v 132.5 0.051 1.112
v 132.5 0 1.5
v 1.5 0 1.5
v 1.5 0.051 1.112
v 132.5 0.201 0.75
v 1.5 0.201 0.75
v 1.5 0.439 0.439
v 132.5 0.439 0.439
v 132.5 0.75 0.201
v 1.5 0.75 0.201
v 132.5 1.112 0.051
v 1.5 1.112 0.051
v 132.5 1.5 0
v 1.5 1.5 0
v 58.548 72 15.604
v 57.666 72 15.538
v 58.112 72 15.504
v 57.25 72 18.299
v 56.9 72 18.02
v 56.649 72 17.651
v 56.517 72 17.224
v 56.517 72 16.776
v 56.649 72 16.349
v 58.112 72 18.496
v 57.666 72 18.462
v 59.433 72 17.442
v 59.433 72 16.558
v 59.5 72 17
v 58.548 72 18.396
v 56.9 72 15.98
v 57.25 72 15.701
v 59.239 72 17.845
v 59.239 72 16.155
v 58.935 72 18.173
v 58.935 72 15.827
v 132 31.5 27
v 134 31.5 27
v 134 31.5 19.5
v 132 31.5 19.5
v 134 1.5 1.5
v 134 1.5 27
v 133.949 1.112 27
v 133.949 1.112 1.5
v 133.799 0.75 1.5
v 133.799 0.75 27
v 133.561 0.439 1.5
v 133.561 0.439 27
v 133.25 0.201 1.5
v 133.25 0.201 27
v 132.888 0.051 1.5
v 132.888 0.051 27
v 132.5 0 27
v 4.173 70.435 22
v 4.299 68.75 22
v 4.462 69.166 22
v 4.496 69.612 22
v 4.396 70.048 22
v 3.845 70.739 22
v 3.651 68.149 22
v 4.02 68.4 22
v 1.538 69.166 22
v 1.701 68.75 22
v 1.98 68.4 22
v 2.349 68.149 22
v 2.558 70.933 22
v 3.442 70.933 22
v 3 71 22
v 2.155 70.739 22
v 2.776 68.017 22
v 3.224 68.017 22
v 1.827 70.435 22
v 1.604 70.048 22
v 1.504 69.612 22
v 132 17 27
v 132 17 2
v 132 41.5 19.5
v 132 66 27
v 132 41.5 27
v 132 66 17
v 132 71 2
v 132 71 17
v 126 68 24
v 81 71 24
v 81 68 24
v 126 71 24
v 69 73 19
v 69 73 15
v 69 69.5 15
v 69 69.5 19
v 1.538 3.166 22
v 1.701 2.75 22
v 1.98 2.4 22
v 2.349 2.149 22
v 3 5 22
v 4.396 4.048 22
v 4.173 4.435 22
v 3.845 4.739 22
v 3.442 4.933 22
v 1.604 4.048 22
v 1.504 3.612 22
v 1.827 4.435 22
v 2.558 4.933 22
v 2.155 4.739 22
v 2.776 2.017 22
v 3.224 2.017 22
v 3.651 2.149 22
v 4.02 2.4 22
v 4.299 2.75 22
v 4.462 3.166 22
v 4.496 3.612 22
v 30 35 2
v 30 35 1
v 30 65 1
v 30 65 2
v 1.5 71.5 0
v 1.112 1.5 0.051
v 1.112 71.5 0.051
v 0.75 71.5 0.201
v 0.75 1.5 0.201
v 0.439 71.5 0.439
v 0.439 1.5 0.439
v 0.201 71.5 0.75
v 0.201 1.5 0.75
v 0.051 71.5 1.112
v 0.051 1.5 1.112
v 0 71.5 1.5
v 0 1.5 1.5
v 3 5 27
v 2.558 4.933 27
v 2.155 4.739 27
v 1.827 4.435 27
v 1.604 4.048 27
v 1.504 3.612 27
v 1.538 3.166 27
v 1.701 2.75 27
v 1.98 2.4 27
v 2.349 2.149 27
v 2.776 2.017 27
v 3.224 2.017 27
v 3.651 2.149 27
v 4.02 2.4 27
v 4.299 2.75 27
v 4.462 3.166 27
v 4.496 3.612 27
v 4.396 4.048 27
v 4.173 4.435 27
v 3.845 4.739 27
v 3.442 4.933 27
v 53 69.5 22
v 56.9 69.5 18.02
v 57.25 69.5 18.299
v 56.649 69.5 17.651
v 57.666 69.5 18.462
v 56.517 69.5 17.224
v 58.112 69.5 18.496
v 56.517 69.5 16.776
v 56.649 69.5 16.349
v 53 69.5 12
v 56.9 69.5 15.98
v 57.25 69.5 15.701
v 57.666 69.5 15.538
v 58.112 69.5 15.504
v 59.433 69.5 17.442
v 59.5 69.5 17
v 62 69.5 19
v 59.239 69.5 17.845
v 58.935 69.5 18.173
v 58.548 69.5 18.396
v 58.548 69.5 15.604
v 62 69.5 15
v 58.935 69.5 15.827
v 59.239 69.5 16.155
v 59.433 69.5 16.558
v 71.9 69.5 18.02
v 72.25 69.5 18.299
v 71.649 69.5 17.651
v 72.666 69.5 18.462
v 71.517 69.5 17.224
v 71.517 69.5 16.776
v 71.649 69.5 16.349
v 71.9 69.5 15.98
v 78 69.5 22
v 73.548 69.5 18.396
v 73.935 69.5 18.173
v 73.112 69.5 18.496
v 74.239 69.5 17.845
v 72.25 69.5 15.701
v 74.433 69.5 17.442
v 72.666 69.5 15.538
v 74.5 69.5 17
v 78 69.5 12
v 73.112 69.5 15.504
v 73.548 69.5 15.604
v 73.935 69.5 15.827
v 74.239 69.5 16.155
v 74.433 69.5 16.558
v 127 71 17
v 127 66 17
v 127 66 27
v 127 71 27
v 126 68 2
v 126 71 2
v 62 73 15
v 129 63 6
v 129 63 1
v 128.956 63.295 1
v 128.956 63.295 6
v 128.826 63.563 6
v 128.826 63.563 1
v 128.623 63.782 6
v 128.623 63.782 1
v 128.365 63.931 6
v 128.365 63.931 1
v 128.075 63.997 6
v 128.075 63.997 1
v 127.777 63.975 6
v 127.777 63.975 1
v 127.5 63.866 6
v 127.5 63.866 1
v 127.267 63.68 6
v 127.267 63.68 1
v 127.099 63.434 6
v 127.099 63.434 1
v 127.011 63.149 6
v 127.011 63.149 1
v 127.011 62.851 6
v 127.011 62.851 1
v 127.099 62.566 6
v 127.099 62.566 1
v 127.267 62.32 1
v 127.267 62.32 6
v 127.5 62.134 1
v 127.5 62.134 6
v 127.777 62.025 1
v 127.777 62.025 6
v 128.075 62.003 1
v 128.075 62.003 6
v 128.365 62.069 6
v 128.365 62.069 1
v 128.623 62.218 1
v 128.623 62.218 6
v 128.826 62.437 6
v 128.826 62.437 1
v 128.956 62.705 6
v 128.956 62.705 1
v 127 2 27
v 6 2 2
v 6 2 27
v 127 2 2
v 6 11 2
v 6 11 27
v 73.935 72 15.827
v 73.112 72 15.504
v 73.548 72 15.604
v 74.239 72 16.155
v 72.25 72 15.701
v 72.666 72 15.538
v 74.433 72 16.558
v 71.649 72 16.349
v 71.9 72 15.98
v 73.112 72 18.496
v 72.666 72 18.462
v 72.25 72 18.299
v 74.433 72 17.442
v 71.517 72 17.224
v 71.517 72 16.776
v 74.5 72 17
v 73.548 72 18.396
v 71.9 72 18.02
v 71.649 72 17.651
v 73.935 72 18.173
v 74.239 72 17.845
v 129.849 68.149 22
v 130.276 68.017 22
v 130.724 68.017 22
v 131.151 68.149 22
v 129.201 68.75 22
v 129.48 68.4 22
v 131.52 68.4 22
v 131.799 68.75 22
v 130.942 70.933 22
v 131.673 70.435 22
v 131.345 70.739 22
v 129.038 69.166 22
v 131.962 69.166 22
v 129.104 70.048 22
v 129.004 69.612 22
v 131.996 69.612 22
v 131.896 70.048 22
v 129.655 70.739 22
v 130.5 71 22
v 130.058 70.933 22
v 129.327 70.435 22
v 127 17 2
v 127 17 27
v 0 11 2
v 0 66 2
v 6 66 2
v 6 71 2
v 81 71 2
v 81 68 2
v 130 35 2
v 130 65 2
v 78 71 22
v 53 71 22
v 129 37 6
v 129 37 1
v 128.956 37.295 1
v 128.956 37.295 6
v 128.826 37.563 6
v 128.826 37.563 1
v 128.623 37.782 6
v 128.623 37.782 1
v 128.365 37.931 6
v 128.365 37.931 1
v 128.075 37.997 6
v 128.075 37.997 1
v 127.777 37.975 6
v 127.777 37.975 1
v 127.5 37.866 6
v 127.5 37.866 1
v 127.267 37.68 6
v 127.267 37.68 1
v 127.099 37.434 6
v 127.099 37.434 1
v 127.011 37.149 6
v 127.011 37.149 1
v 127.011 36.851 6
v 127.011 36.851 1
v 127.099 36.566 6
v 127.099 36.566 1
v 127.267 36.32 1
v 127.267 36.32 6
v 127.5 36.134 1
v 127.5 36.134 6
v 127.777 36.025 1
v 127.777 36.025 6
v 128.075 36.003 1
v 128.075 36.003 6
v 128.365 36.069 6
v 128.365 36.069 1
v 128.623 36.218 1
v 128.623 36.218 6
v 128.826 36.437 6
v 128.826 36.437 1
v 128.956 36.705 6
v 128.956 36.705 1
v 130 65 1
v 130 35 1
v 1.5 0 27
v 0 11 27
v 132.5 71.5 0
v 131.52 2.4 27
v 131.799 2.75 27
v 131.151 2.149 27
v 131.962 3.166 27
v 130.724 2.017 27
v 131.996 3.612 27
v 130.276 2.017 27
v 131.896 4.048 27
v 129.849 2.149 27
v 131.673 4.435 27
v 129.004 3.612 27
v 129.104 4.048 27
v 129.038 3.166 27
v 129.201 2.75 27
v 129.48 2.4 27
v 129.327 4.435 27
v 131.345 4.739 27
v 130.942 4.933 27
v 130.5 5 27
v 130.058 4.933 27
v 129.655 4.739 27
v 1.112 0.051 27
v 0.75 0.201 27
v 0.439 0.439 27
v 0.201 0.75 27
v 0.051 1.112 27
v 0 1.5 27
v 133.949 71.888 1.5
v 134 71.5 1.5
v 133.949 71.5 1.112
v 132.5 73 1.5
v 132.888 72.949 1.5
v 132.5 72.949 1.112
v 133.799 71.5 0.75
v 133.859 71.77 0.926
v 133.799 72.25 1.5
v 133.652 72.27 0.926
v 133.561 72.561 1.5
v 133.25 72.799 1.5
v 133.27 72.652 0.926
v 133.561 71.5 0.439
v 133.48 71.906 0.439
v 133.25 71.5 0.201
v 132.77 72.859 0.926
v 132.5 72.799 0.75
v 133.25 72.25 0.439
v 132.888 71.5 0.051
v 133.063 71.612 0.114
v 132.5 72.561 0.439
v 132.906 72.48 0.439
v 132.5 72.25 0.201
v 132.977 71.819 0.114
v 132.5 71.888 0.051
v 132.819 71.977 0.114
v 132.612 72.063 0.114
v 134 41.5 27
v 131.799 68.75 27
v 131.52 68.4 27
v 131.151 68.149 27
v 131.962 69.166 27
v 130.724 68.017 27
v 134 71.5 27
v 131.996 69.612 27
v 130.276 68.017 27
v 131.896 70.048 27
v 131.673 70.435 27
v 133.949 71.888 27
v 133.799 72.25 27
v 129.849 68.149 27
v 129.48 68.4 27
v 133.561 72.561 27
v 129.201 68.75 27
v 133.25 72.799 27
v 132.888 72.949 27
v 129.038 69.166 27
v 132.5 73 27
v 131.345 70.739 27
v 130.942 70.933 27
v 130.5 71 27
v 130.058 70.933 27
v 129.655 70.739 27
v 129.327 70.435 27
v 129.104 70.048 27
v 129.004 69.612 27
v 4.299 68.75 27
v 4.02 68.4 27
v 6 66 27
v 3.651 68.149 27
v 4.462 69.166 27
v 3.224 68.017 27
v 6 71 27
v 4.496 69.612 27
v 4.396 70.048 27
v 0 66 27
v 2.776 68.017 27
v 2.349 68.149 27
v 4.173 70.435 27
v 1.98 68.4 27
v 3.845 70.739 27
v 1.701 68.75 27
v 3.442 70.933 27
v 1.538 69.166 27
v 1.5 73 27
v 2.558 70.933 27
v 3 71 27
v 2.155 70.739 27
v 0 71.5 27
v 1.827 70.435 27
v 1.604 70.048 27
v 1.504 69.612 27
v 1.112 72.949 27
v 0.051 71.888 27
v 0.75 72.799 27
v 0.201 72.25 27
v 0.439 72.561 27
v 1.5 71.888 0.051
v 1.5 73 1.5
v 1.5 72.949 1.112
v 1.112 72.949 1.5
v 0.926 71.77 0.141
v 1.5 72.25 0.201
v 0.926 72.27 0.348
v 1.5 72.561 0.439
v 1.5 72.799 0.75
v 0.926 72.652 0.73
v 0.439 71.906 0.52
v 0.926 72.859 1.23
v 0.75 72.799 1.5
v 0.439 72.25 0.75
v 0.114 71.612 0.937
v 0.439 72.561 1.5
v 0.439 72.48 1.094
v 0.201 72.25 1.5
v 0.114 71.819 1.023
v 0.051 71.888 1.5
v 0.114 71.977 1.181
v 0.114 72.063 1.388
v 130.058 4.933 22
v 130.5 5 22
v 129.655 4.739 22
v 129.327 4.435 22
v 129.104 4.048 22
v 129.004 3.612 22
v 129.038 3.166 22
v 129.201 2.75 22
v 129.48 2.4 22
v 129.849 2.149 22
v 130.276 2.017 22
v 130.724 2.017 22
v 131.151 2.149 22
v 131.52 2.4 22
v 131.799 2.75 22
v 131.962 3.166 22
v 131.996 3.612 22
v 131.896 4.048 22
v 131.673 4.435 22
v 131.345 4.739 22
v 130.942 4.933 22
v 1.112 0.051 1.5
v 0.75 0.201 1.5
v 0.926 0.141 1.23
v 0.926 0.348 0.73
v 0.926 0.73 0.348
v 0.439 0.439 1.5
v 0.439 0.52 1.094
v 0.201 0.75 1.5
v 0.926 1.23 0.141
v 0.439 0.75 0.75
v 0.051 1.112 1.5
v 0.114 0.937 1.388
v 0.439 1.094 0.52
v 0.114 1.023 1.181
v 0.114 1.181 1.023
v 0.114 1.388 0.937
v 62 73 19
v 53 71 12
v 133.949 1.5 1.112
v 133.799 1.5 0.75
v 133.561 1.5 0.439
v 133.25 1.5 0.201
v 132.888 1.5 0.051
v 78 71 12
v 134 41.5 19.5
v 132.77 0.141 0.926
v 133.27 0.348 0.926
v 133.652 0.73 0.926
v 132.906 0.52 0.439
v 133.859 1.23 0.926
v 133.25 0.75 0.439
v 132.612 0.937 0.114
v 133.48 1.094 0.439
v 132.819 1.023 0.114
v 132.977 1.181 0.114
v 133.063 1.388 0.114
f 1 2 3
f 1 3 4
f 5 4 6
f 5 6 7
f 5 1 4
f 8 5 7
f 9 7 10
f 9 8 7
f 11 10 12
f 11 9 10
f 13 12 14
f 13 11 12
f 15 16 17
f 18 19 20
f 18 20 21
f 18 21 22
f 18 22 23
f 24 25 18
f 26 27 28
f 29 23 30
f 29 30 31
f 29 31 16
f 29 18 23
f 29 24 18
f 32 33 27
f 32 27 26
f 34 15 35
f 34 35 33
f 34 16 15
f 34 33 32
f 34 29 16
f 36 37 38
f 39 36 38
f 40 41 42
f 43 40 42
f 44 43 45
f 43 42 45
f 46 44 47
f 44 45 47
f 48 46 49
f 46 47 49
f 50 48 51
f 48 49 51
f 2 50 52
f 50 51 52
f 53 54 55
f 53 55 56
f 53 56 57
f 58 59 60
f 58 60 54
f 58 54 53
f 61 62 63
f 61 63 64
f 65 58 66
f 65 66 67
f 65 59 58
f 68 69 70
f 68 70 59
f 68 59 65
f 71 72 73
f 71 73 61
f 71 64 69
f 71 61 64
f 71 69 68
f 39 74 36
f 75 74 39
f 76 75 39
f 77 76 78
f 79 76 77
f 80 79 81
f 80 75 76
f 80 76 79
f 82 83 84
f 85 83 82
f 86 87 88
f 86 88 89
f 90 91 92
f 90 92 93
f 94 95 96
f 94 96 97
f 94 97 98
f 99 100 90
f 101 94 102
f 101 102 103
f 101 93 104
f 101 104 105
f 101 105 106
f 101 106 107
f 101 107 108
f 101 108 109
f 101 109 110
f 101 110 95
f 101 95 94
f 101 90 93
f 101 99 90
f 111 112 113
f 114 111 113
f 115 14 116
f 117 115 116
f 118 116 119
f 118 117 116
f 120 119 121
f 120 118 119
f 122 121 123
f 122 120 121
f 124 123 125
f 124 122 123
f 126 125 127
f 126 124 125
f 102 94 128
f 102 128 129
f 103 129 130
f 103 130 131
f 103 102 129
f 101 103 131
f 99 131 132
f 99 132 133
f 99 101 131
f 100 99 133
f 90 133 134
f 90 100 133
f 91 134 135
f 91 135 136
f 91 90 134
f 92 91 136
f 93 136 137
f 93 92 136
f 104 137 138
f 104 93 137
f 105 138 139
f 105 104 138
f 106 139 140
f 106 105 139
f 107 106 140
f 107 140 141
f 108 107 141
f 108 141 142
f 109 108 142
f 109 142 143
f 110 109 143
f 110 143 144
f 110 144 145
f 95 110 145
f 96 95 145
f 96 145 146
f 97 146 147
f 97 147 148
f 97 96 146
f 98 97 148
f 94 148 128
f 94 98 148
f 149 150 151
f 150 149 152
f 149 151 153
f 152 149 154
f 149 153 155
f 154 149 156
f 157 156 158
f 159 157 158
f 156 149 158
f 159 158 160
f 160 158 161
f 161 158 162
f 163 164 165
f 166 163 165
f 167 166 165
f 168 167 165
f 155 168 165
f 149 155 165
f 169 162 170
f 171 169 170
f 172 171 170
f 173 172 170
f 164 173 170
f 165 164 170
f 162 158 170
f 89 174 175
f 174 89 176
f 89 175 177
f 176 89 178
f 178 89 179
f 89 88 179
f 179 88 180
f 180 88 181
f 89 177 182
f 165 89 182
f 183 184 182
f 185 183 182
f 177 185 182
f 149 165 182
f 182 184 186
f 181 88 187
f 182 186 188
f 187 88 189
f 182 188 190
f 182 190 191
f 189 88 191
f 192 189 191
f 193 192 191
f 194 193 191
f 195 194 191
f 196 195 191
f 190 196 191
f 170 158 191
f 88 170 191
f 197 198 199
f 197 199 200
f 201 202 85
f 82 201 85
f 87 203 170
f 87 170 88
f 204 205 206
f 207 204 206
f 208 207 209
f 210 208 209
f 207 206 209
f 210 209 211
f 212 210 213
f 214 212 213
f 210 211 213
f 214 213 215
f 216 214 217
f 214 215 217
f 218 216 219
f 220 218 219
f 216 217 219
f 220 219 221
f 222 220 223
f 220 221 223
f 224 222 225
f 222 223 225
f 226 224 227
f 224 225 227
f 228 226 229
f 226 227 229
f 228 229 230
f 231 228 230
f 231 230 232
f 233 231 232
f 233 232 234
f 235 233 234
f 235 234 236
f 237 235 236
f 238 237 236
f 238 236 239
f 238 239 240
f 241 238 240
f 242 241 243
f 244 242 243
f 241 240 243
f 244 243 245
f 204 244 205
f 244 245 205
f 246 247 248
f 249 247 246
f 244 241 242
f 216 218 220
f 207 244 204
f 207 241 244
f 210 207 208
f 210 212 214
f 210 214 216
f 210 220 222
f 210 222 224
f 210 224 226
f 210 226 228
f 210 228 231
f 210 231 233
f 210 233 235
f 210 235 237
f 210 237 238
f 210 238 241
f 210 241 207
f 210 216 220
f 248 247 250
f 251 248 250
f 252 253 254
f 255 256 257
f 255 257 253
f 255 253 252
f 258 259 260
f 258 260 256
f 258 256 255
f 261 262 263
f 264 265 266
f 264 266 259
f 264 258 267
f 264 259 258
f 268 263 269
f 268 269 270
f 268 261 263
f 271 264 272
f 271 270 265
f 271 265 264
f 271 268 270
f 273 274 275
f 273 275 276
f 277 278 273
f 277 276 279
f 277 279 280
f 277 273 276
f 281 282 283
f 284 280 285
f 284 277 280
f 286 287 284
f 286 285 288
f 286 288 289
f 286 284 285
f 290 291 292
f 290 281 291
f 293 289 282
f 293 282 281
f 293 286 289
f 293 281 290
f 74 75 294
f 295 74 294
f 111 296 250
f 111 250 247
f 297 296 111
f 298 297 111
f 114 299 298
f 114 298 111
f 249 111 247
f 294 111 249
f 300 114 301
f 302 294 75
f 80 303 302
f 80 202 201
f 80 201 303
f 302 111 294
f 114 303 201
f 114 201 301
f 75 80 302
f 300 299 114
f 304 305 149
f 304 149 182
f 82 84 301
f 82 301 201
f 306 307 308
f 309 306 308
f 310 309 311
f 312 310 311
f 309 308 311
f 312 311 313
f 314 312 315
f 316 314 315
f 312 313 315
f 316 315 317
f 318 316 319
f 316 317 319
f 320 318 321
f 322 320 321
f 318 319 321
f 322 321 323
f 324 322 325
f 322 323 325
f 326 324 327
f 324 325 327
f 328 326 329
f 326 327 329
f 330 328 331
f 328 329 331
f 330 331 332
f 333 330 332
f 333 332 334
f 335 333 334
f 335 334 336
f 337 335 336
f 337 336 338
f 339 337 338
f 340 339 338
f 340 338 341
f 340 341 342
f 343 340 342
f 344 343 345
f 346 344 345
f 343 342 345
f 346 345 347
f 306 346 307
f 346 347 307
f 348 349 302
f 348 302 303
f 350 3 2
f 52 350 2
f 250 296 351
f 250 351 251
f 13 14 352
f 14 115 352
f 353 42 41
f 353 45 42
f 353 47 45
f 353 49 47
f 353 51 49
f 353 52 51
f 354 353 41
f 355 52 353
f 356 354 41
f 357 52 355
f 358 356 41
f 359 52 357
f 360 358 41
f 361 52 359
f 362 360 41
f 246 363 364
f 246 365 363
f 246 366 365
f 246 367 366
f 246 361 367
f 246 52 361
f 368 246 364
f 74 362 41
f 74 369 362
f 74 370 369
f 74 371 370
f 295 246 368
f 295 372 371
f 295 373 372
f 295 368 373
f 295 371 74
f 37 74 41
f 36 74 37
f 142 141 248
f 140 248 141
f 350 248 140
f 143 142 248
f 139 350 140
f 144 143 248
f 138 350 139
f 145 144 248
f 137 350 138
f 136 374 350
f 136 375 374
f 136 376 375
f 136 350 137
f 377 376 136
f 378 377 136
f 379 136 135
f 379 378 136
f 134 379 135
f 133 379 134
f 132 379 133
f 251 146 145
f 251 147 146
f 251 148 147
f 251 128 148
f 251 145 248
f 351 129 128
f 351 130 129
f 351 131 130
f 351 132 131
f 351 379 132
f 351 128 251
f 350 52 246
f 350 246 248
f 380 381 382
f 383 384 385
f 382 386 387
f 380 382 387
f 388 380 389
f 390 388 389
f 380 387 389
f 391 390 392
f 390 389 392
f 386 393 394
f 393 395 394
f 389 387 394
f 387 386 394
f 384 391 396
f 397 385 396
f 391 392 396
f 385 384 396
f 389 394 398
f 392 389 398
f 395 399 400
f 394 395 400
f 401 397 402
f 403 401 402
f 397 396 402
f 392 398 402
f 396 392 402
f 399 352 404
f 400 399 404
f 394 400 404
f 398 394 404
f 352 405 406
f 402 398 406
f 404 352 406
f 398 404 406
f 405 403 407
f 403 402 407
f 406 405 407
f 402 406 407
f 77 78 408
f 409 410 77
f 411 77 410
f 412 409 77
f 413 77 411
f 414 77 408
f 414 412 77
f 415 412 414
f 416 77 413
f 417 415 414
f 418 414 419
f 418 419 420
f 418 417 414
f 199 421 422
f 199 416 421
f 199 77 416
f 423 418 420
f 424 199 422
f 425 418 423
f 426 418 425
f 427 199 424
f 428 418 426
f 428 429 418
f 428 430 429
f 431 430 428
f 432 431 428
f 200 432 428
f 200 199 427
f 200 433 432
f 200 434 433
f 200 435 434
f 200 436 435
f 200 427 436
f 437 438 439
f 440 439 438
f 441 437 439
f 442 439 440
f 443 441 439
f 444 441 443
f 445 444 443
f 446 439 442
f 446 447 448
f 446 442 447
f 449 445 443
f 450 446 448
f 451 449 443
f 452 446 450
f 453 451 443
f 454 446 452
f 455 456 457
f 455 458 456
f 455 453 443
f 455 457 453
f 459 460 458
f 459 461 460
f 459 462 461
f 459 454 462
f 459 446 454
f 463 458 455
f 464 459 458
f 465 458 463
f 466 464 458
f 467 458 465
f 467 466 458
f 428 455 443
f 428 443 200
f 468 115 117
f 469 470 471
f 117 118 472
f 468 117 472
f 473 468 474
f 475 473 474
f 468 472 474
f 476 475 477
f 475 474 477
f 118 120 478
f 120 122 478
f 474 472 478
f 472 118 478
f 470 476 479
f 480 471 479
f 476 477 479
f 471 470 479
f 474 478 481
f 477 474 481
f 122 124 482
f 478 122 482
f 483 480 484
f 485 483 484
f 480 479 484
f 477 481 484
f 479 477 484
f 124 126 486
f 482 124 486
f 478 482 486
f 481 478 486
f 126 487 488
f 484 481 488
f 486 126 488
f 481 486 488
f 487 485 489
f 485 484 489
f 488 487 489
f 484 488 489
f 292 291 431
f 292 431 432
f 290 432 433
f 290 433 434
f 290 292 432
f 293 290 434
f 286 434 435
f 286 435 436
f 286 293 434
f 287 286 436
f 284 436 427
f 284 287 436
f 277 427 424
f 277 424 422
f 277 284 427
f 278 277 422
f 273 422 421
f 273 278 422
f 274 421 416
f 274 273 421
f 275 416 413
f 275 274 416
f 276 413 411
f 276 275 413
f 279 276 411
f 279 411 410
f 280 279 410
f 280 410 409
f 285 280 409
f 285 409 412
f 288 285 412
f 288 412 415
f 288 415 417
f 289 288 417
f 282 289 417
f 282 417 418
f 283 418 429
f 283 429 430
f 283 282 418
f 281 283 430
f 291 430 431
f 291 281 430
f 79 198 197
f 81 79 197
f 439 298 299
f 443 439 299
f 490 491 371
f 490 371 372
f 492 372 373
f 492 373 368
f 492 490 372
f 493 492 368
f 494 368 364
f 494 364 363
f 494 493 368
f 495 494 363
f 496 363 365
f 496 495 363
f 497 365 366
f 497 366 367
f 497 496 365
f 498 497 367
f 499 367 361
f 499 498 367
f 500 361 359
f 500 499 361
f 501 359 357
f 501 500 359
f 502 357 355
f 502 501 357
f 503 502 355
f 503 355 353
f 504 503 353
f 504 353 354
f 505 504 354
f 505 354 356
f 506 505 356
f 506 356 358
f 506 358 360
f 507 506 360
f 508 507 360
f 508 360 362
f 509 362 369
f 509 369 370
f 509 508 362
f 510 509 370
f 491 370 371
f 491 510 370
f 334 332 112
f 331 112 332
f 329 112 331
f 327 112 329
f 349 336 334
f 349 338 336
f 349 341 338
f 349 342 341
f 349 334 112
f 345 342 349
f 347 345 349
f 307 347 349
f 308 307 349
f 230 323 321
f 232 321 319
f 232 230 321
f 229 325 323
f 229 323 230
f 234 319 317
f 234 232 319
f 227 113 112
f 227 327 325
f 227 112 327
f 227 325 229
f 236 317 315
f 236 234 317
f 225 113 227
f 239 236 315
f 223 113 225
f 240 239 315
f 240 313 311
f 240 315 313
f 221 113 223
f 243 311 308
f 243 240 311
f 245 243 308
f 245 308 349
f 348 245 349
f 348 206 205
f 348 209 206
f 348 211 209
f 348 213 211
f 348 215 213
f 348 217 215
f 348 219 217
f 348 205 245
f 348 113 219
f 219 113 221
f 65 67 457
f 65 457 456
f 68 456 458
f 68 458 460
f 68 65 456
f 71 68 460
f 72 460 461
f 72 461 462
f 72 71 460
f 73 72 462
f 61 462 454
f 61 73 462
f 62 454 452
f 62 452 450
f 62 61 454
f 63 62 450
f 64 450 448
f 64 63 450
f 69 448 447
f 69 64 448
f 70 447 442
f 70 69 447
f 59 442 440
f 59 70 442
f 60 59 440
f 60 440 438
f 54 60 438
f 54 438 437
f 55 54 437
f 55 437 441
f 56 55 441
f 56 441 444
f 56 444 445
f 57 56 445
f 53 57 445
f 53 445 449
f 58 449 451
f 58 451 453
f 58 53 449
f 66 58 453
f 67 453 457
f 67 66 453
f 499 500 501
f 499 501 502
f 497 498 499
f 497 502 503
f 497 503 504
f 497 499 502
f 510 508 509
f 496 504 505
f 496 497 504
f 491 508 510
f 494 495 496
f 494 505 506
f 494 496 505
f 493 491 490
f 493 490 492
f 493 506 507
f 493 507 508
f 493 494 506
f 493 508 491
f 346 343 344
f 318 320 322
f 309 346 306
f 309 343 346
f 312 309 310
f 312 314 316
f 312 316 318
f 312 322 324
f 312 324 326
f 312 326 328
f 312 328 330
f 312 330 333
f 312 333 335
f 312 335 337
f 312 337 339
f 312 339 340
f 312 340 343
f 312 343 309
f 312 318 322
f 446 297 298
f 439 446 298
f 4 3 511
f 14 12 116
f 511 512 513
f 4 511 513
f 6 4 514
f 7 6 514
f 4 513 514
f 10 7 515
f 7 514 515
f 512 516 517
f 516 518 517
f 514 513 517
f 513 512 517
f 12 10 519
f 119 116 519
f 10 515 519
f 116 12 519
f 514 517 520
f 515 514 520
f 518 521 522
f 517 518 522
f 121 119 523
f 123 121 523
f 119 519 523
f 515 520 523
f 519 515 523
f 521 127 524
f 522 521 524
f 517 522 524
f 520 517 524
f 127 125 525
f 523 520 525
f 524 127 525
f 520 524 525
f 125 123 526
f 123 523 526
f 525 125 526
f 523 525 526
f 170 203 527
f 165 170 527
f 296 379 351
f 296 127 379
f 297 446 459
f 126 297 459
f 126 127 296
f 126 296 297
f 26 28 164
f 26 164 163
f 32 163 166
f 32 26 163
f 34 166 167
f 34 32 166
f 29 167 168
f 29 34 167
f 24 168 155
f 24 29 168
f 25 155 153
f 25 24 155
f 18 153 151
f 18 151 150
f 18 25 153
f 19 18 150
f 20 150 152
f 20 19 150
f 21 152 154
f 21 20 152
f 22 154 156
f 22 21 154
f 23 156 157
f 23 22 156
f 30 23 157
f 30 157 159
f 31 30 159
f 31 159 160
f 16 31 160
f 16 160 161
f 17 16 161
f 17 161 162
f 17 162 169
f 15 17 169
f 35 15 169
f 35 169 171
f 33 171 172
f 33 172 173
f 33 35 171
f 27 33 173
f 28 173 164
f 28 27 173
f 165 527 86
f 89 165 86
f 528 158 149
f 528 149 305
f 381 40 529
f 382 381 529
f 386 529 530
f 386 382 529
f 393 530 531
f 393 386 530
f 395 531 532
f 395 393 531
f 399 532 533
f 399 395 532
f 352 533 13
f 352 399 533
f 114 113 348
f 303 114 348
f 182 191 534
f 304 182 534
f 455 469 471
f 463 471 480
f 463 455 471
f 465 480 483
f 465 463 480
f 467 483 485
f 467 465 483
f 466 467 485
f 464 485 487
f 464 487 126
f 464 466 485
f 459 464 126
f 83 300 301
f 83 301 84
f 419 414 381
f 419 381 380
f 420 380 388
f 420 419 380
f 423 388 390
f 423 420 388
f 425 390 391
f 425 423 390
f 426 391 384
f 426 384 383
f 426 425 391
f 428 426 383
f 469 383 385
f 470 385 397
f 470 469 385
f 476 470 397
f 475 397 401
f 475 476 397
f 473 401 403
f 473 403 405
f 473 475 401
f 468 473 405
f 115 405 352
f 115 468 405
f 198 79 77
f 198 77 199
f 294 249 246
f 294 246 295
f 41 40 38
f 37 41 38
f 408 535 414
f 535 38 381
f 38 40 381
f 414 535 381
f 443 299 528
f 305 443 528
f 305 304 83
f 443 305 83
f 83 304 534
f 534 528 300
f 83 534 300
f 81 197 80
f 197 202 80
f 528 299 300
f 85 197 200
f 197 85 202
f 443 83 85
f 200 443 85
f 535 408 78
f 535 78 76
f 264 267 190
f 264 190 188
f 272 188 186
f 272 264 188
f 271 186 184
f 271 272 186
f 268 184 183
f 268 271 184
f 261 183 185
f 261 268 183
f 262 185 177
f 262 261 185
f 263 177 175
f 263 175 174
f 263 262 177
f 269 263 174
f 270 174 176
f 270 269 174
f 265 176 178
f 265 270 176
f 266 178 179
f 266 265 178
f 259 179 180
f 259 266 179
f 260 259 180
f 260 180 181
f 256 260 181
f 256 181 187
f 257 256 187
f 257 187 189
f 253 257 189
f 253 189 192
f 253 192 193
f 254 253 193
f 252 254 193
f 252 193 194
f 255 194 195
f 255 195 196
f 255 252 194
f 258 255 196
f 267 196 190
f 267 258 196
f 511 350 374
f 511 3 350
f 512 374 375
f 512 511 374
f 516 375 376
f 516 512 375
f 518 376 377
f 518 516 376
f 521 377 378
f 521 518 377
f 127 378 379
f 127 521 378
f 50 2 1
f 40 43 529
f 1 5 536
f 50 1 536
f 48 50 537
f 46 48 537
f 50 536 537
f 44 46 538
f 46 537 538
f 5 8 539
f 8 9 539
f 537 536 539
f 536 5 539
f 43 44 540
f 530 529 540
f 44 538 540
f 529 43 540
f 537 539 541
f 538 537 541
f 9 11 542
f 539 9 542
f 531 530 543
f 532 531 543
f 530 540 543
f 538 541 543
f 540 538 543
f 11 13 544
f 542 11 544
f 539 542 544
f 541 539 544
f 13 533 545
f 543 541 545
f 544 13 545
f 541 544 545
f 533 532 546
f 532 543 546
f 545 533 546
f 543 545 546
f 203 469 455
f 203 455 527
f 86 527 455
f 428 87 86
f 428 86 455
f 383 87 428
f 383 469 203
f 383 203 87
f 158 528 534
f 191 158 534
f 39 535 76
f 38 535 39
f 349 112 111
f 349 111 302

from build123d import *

# Parameters (mm, degrees)
BOX_W             = 134
BOX_H             = 73
BOX_DEPTH         = 27
BOX001_W          = 126
BOX001_H          = 69
BOX001_DEPTH      = 25
BOX002_W          = 10
BOX002_H          = 55
BOX002_DEPTH      = 25
BOX003_W          = 100
BOX003_H          = 30
BOX003_DEPTH      = 1
CYLINDER_R        = 1
CYLINDER_DEPTH    = 5
CYLINDER001_R     = 1
CYLINDER001_DEPTH = 5
BOX004_W          = 25
BOX004_H          = 1.5
BOX004_DEPTH      = 10
BOX005_W          = 7
BOX005_H          = 4
BOX005_DEPTH      = 7
CYLINDER002_R     = 1.5
CYLINDER002_DEPTH = 2.5
CYLINDER003_R     = 1.5
CYLINDER003_DEPTH = 2.5
BOX006_W          = 45
BOX006_H          = 22
BOX006_DEPTH      = 3
BOX007_W          = 7.5
BOX007_H          = 10
BOX007_DEPTH      = 2
BOX008_W          = 15
BOX008_H          = 5
BOX008_DEPTH      = 25
BOX009_W          = 5
BOX009_H          = 5
BOX009_DEPTH      = 10
CYLINDER004_R     = 1.5
CYLINDER004_DEPTH = 5
CYLINDER005_R     = 1.5
CYLINDER005_DEPTH = 5
CYLINDER006_R     = 1.5
CYLINDER006_DEPTH = 5
CYLINDER007_R     = 1.5
CYLINDER007_DEPTH = 5
FILLET_R          = 1.5
FILLET001_R       = 1.5
FILLET002_R       = 1.5
FILLET003_R       = 1.5


with BuildPart() as part:
    # Box → Box (join)
    with BuildSketch(Plane.XY):
        with Locations((67, 36.5)):
            Rectangle(BOX_W, BOX_H)
    extrude(amount=BOX_DEPTH)

    # Box001 → Box001 (cut)
    with BuildSketch(Plane(origin=(6, 2, 2), x_dir=(1, 0, 0), z_dir=(0, 0, 1))):
        with Locations((63, 34.5)):
            Rectangle(BOX001_W, BOX001_H)
    extrude(amount=BOX001_DEPTH, mode=Mode.SUBTRACT)

    # Box002 → Box002 (cut)
    with BuildSketch(Plane(origin=(-2, 11, 2), x_dir=(1, 0, 0), z_dir=(0, 0, 1))):
        with Locations((5, 27.5)):
            Rectangle(BOX002_W, BOX002_H)
    extrude(amount=BOX002_DEPTH, mode=Mode.SUBTRACT)

    # Box003 → Box003 (cut)
    with BuildSketch(Plane(origin=(30, 35, 1), x_dir=(1, 0, 0), z_dir=(0, 0, 1))):
        with Locations((50, 15)):
            Rectangle(BOX003_W, BOX003_H)
    extrude(amount=BOX003_DEPTH, mode=Mode.SUBTRACT)

    # Cylinder → Cylinder (join)
    with BuildSketch(Plane(origin=(128, 37, 1), x_dir=(1, 0, 0), z_dir=(0, 0, 1))):
        Circle(CYLINDER_R)
    extrude(amount=CYLINDER_DEPTH)

    # Cylinder001 → Cylinder001 (join)
    with BuildSketch(Plane(origin=(128, 63, 1), x_dir=(1, 0, 0), z_dir=(0, 0, 1))):
        Circle(CYLINDER001_R)
    extrude(amount=CYLINDER001_DEPTH)

    # Box004 → Box004 (join)
    with BuildSketch(Plane(origin=(53, 69.5, 12), x_dir=(1, 0, 0), z_dir=(0, 0, 1))):
        with Locations((12.5, 0.75)):
            Rectangle(BOX004_W, BOX004_H)
    extrude(amount=BOX004_DEPTH)

    # Box005 → Box005 (cut)
    with BuildSketch(Plane(origin=(62, 74.5, 15), x_dir=(1, 0, 0), z_dir=(0, -1, 0))):
        with Locations((3.5, 2)):
            Rectangle(BOX005_W, BOX005_H)
    extrude(amount=BOX005_DEPTH, mode=Mode.SUBTRACT)

    # Cylinder002 → Cylinder002 (cut)
    with BuildSketch(Plane(origin=(58, 72, 17), x_dir=(1, 0, 0), z_dir=(0, -1, 0))):
        Circle(CYLINDER002_R)
    extrude(amount=CYLINDER002_DEPTH, mode=Mode.SUBTRACT)

    # Cylinder003 → Cylinder003 (cut)
    with BuildSketch(Plane(origin=(73, 72, 17), x_dir=(1, 0, 0), z_dir=(0, -1, 0))):
        Circle(CYLINDER003_R)
    extrude(amount=CYLINDER003_DEPTH, mode=Mode.SUBTRACT)

    # Box006 → Box006 (join)
    with BuildSketch(Plane(origin=(81, 71, 2), x_dir=(1, 0, 0), z_dir=(0, -1, 0))):
        with Locations((22.5, 11)):
            Rectangle(BOX006_W, BOX006_H)
    extrude(amount=BOX006_DEPTH)

    # Box007 → Box007 (cut)
    with BuildSketch(Plane(origin=(134, 41.5, 27), x_dir=(0, 0, -1), z_dir=(-1, 0, 0))):
        with Locations((3.75, 5)):
            Rectangle(BOX007_W, BOX007_H)
    extrude(amount=BOX007_DEPTH, mode=Mode.SUBTRACT)

    # Box008 → Box008 (join)
    with BuildSketch(Plane(origin=(132, 2, 2), x_dir=(0, 1, 0), z_dir=(0, 0, 1))):
        with Locations((7.5, 2.5)):
            Rectangle(BOX008_W, BOX008_H)
    extrude(amount=BOX008_DEPTH)

    # Box009 → Box009 (join)
    with BuildSketch(Plane(origin=(132, 66, 17), x_dir=(0, 1, 0), z_dir=(0, 0, 1))):
        with Locations((2.5, 2.5)):
            Rectangle(BOX009_W, BOX009_H)
    extrude(amount=BOX009_DEPTH)

    # Cylinder004 → Cylinder004 (cut)
    with BuildSketch(Plane(origin=(130.5, 69.5, 22), x_dir=(0, 1, 0), z_dir=(0, 0, 1))):
        Circle(CYLINDER004_R)
    extrude(amount=CYLINDER004_DEPTH, mode=Mode.SUBTRACT)

    # Cylinder005 → Cylinder005 (cut)
    with BuildSketch(Plane(origin=(130.5, 3.5, 22), x_dir=(0, 1, 0), z_dir=(0, 0, 1))):
        Circle(CYLINDER005_R)
    extrude(amount=CYLINDER005_DEPTH, mode=Mode.SUBTRACT)

    # Cylinder006 → Cylinder006 (cut)
    with BuildSketch(Plane(origin=(3, 3.5, 22), x_dir=(0, 1, 0), z_dir=(0, 0, 1))):
        Circle(CYLINDER006_R)
    extrude(amount=CYLINDER006_DEPTH, mode=Mode.SUBTRACT)

    # Cylinder007 → Cylinder007 (cut)
    with BuildSketch(Plane(origin=(3, 69.5, 22), x_dir=(0, 1, 0), z_dir=(0, 0, 1))):
        Circle(CYLINDER007_R)
    extrude(amount=CYLINDER007_DEPTH, mode=Mode.SUBTRACT)

    # Fillet
    fillet_edges = [part.edges().sort_by_distance(p)[0] for p in [
        (134, 0, 13.5),
    ]]
    fillet(fillet_edges, radius=FILLET_R)

    # Fillet001
    fillet001_edges = [part.edges().sort_by_distance(p)[0] for p in [
        (134, 73, 13.5),
    ]]
    fillet(fillet001_edges, radius=FILLET001_R)

    # Fillet002
    fillet002_edges = [part.edges().sort_by_distance(p)[0] for p in [
        (134, 36.5, 0),
    ]]
    fillet(fillet002_edges, radius=FILLET002_R)

    # Fillet003
    fillet003_edges = [part.edges().sort_by_distance(p)[0] for p in [
        (0, 73, 14.25),
        (0, 36.5, 0),
        (0, 0, 14.25),
    ]]
    fillet(fillet003_edges, radius=FILLET003_R)


solid = part.part
